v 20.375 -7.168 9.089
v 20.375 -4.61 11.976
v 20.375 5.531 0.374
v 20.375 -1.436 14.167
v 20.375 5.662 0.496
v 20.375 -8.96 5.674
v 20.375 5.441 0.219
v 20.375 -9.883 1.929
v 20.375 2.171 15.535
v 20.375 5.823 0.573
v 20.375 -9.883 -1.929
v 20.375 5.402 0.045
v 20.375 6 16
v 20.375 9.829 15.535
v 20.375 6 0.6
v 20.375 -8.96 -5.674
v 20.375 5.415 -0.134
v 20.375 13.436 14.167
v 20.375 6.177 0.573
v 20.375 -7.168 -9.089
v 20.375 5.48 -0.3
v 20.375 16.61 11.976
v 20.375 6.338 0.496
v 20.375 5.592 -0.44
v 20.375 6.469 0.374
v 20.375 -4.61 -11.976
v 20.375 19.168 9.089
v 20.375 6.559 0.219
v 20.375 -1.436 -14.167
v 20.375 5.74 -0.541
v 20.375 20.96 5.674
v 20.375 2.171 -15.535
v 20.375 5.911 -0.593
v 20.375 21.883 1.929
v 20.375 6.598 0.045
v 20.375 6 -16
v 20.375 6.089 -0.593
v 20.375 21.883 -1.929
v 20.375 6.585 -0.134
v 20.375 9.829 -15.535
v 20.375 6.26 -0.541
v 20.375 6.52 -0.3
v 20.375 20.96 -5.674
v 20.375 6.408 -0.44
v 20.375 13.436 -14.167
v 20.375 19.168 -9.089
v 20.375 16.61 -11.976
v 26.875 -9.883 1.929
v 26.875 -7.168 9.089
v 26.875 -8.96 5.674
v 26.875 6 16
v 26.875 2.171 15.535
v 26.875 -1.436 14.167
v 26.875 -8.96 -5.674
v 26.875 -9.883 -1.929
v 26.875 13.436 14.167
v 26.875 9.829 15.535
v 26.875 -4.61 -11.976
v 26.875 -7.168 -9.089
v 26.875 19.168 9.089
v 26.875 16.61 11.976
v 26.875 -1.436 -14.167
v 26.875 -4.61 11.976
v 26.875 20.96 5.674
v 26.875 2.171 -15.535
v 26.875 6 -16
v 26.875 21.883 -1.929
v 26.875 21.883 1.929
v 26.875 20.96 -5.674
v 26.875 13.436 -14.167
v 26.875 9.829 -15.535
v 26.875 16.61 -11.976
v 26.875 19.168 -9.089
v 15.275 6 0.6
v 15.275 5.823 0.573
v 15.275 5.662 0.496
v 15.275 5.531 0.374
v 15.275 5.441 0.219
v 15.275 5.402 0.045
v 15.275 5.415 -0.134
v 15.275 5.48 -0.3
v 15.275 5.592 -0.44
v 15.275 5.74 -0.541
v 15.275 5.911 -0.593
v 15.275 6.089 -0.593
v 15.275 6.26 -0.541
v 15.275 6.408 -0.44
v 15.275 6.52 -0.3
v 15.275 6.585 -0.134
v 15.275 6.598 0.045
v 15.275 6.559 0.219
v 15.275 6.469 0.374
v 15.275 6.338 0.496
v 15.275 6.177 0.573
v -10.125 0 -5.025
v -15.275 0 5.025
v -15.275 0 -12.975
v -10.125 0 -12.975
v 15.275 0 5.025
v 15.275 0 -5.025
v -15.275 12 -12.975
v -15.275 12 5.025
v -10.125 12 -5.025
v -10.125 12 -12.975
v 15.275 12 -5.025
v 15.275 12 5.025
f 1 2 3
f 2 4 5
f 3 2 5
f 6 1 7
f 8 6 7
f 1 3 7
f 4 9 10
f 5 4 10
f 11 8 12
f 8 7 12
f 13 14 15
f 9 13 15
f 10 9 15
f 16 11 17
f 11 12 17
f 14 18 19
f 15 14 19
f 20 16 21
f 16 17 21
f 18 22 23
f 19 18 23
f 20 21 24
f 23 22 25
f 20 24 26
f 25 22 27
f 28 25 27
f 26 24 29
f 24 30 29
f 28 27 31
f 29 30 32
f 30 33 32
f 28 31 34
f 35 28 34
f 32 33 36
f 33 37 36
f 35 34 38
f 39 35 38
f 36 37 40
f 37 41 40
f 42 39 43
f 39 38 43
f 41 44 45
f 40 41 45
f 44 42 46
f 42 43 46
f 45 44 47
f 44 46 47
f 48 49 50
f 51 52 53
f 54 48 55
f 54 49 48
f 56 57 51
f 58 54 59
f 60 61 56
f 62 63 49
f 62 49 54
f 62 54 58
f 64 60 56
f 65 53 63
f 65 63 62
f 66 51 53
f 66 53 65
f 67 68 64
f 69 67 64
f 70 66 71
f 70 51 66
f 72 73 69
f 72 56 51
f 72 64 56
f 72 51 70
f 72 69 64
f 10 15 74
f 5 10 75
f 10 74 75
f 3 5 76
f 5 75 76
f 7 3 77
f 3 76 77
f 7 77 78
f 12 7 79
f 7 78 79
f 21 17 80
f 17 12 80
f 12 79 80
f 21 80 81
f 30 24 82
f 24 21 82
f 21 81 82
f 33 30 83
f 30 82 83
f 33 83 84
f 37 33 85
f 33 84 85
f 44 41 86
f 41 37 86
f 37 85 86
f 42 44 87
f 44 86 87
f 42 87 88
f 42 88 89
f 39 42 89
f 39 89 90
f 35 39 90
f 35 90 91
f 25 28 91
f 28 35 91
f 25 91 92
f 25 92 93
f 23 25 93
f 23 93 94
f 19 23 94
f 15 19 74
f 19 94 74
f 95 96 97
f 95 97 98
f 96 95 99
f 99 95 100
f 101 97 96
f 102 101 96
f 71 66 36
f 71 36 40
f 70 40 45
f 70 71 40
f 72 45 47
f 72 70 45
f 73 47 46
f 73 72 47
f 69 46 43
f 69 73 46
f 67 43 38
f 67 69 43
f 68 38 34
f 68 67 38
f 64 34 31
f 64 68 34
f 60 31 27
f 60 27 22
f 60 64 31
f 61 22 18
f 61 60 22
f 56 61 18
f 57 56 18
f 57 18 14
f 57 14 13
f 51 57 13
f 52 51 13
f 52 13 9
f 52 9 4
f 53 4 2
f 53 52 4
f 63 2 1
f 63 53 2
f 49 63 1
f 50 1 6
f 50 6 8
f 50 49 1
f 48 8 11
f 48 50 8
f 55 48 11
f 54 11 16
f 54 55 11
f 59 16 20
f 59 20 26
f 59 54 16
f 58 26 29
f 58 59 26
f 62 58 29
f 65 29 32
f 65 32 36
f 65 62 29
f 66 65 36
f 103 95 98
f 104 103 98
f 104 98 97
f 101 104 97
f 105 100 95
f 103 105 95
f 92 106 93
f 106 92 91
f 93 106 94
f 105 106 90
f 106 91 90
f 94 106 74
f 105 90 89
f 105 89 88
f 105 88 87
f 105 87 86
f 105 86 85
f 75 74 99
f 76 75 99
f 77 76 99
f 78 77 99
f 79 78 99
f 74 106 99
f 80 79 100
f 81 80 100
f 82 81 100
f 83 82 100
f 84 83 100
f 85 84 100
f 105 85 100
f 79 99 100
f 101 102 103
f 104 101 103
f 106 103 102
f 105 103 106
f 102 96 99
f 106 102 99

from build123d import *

# Parameters (mm, degrees)
SKETCH_1_W      = 5.15
SKETCH_1_H      = 5.025
EXTRUDE_1_DEPTH = 12
SKETCH_2_R      = 0.6
EXTRUDE_2_DEPTH = 11.6
SKETCH_3_R      = 16
EXTRUDE_3_DEPTH = 6.5


with BuildPart() as part:
    # 草图1 → 凸台-拉伸1 (new body)
    with BuildSketch(Plane(origin=(0, 0, 0), x_dir=(1, 0, 0), z_dir=(0, 1, 0))):
        Polygon((-10.125, 5.025), (-10.125, 0), (-10.125, -5.025), (15.275, -5.025), (15.275, 5.025), align=None)
        Polygon((-15.275, 12.975), (-15.275, 0), (-10.125, 0), (-10.125, 5.025), (-10.125, 12.975), align=None)
        with Locations((-12.7, -2.5125)):
            Rectangle(SKETCH_1_W, SKETCH_1_H)
    extrude(amount=EXTRUDE_1_DEPTH)

    # 草图2 → 凸台-拉伸2 (add)
    with BuildSketch(Plane(origin=(15.275, 0, 0), x_dir=(0, 0, -1), z_dir=(1, 0, 0))):
        with Locations(Location((0, 6, 0), (0, 0, 180))):
            Circle(SKETCH_2_R)
    extrude(amount=EXTRUDE_2_DEPTH)

    # 草图3 → 凸台-拉伸3 (add)
    with BuildSketch(Plane(origin=(26.875, 0, 0), x_dir=(0, 0, -1), z_dir=(1, 0, 0))):
        with Locations((0, 6)):
            Circle(SKETCH_3_R)
    extrude(amount=-EXTRUDE_3_DEPTH)


solid = part.part
